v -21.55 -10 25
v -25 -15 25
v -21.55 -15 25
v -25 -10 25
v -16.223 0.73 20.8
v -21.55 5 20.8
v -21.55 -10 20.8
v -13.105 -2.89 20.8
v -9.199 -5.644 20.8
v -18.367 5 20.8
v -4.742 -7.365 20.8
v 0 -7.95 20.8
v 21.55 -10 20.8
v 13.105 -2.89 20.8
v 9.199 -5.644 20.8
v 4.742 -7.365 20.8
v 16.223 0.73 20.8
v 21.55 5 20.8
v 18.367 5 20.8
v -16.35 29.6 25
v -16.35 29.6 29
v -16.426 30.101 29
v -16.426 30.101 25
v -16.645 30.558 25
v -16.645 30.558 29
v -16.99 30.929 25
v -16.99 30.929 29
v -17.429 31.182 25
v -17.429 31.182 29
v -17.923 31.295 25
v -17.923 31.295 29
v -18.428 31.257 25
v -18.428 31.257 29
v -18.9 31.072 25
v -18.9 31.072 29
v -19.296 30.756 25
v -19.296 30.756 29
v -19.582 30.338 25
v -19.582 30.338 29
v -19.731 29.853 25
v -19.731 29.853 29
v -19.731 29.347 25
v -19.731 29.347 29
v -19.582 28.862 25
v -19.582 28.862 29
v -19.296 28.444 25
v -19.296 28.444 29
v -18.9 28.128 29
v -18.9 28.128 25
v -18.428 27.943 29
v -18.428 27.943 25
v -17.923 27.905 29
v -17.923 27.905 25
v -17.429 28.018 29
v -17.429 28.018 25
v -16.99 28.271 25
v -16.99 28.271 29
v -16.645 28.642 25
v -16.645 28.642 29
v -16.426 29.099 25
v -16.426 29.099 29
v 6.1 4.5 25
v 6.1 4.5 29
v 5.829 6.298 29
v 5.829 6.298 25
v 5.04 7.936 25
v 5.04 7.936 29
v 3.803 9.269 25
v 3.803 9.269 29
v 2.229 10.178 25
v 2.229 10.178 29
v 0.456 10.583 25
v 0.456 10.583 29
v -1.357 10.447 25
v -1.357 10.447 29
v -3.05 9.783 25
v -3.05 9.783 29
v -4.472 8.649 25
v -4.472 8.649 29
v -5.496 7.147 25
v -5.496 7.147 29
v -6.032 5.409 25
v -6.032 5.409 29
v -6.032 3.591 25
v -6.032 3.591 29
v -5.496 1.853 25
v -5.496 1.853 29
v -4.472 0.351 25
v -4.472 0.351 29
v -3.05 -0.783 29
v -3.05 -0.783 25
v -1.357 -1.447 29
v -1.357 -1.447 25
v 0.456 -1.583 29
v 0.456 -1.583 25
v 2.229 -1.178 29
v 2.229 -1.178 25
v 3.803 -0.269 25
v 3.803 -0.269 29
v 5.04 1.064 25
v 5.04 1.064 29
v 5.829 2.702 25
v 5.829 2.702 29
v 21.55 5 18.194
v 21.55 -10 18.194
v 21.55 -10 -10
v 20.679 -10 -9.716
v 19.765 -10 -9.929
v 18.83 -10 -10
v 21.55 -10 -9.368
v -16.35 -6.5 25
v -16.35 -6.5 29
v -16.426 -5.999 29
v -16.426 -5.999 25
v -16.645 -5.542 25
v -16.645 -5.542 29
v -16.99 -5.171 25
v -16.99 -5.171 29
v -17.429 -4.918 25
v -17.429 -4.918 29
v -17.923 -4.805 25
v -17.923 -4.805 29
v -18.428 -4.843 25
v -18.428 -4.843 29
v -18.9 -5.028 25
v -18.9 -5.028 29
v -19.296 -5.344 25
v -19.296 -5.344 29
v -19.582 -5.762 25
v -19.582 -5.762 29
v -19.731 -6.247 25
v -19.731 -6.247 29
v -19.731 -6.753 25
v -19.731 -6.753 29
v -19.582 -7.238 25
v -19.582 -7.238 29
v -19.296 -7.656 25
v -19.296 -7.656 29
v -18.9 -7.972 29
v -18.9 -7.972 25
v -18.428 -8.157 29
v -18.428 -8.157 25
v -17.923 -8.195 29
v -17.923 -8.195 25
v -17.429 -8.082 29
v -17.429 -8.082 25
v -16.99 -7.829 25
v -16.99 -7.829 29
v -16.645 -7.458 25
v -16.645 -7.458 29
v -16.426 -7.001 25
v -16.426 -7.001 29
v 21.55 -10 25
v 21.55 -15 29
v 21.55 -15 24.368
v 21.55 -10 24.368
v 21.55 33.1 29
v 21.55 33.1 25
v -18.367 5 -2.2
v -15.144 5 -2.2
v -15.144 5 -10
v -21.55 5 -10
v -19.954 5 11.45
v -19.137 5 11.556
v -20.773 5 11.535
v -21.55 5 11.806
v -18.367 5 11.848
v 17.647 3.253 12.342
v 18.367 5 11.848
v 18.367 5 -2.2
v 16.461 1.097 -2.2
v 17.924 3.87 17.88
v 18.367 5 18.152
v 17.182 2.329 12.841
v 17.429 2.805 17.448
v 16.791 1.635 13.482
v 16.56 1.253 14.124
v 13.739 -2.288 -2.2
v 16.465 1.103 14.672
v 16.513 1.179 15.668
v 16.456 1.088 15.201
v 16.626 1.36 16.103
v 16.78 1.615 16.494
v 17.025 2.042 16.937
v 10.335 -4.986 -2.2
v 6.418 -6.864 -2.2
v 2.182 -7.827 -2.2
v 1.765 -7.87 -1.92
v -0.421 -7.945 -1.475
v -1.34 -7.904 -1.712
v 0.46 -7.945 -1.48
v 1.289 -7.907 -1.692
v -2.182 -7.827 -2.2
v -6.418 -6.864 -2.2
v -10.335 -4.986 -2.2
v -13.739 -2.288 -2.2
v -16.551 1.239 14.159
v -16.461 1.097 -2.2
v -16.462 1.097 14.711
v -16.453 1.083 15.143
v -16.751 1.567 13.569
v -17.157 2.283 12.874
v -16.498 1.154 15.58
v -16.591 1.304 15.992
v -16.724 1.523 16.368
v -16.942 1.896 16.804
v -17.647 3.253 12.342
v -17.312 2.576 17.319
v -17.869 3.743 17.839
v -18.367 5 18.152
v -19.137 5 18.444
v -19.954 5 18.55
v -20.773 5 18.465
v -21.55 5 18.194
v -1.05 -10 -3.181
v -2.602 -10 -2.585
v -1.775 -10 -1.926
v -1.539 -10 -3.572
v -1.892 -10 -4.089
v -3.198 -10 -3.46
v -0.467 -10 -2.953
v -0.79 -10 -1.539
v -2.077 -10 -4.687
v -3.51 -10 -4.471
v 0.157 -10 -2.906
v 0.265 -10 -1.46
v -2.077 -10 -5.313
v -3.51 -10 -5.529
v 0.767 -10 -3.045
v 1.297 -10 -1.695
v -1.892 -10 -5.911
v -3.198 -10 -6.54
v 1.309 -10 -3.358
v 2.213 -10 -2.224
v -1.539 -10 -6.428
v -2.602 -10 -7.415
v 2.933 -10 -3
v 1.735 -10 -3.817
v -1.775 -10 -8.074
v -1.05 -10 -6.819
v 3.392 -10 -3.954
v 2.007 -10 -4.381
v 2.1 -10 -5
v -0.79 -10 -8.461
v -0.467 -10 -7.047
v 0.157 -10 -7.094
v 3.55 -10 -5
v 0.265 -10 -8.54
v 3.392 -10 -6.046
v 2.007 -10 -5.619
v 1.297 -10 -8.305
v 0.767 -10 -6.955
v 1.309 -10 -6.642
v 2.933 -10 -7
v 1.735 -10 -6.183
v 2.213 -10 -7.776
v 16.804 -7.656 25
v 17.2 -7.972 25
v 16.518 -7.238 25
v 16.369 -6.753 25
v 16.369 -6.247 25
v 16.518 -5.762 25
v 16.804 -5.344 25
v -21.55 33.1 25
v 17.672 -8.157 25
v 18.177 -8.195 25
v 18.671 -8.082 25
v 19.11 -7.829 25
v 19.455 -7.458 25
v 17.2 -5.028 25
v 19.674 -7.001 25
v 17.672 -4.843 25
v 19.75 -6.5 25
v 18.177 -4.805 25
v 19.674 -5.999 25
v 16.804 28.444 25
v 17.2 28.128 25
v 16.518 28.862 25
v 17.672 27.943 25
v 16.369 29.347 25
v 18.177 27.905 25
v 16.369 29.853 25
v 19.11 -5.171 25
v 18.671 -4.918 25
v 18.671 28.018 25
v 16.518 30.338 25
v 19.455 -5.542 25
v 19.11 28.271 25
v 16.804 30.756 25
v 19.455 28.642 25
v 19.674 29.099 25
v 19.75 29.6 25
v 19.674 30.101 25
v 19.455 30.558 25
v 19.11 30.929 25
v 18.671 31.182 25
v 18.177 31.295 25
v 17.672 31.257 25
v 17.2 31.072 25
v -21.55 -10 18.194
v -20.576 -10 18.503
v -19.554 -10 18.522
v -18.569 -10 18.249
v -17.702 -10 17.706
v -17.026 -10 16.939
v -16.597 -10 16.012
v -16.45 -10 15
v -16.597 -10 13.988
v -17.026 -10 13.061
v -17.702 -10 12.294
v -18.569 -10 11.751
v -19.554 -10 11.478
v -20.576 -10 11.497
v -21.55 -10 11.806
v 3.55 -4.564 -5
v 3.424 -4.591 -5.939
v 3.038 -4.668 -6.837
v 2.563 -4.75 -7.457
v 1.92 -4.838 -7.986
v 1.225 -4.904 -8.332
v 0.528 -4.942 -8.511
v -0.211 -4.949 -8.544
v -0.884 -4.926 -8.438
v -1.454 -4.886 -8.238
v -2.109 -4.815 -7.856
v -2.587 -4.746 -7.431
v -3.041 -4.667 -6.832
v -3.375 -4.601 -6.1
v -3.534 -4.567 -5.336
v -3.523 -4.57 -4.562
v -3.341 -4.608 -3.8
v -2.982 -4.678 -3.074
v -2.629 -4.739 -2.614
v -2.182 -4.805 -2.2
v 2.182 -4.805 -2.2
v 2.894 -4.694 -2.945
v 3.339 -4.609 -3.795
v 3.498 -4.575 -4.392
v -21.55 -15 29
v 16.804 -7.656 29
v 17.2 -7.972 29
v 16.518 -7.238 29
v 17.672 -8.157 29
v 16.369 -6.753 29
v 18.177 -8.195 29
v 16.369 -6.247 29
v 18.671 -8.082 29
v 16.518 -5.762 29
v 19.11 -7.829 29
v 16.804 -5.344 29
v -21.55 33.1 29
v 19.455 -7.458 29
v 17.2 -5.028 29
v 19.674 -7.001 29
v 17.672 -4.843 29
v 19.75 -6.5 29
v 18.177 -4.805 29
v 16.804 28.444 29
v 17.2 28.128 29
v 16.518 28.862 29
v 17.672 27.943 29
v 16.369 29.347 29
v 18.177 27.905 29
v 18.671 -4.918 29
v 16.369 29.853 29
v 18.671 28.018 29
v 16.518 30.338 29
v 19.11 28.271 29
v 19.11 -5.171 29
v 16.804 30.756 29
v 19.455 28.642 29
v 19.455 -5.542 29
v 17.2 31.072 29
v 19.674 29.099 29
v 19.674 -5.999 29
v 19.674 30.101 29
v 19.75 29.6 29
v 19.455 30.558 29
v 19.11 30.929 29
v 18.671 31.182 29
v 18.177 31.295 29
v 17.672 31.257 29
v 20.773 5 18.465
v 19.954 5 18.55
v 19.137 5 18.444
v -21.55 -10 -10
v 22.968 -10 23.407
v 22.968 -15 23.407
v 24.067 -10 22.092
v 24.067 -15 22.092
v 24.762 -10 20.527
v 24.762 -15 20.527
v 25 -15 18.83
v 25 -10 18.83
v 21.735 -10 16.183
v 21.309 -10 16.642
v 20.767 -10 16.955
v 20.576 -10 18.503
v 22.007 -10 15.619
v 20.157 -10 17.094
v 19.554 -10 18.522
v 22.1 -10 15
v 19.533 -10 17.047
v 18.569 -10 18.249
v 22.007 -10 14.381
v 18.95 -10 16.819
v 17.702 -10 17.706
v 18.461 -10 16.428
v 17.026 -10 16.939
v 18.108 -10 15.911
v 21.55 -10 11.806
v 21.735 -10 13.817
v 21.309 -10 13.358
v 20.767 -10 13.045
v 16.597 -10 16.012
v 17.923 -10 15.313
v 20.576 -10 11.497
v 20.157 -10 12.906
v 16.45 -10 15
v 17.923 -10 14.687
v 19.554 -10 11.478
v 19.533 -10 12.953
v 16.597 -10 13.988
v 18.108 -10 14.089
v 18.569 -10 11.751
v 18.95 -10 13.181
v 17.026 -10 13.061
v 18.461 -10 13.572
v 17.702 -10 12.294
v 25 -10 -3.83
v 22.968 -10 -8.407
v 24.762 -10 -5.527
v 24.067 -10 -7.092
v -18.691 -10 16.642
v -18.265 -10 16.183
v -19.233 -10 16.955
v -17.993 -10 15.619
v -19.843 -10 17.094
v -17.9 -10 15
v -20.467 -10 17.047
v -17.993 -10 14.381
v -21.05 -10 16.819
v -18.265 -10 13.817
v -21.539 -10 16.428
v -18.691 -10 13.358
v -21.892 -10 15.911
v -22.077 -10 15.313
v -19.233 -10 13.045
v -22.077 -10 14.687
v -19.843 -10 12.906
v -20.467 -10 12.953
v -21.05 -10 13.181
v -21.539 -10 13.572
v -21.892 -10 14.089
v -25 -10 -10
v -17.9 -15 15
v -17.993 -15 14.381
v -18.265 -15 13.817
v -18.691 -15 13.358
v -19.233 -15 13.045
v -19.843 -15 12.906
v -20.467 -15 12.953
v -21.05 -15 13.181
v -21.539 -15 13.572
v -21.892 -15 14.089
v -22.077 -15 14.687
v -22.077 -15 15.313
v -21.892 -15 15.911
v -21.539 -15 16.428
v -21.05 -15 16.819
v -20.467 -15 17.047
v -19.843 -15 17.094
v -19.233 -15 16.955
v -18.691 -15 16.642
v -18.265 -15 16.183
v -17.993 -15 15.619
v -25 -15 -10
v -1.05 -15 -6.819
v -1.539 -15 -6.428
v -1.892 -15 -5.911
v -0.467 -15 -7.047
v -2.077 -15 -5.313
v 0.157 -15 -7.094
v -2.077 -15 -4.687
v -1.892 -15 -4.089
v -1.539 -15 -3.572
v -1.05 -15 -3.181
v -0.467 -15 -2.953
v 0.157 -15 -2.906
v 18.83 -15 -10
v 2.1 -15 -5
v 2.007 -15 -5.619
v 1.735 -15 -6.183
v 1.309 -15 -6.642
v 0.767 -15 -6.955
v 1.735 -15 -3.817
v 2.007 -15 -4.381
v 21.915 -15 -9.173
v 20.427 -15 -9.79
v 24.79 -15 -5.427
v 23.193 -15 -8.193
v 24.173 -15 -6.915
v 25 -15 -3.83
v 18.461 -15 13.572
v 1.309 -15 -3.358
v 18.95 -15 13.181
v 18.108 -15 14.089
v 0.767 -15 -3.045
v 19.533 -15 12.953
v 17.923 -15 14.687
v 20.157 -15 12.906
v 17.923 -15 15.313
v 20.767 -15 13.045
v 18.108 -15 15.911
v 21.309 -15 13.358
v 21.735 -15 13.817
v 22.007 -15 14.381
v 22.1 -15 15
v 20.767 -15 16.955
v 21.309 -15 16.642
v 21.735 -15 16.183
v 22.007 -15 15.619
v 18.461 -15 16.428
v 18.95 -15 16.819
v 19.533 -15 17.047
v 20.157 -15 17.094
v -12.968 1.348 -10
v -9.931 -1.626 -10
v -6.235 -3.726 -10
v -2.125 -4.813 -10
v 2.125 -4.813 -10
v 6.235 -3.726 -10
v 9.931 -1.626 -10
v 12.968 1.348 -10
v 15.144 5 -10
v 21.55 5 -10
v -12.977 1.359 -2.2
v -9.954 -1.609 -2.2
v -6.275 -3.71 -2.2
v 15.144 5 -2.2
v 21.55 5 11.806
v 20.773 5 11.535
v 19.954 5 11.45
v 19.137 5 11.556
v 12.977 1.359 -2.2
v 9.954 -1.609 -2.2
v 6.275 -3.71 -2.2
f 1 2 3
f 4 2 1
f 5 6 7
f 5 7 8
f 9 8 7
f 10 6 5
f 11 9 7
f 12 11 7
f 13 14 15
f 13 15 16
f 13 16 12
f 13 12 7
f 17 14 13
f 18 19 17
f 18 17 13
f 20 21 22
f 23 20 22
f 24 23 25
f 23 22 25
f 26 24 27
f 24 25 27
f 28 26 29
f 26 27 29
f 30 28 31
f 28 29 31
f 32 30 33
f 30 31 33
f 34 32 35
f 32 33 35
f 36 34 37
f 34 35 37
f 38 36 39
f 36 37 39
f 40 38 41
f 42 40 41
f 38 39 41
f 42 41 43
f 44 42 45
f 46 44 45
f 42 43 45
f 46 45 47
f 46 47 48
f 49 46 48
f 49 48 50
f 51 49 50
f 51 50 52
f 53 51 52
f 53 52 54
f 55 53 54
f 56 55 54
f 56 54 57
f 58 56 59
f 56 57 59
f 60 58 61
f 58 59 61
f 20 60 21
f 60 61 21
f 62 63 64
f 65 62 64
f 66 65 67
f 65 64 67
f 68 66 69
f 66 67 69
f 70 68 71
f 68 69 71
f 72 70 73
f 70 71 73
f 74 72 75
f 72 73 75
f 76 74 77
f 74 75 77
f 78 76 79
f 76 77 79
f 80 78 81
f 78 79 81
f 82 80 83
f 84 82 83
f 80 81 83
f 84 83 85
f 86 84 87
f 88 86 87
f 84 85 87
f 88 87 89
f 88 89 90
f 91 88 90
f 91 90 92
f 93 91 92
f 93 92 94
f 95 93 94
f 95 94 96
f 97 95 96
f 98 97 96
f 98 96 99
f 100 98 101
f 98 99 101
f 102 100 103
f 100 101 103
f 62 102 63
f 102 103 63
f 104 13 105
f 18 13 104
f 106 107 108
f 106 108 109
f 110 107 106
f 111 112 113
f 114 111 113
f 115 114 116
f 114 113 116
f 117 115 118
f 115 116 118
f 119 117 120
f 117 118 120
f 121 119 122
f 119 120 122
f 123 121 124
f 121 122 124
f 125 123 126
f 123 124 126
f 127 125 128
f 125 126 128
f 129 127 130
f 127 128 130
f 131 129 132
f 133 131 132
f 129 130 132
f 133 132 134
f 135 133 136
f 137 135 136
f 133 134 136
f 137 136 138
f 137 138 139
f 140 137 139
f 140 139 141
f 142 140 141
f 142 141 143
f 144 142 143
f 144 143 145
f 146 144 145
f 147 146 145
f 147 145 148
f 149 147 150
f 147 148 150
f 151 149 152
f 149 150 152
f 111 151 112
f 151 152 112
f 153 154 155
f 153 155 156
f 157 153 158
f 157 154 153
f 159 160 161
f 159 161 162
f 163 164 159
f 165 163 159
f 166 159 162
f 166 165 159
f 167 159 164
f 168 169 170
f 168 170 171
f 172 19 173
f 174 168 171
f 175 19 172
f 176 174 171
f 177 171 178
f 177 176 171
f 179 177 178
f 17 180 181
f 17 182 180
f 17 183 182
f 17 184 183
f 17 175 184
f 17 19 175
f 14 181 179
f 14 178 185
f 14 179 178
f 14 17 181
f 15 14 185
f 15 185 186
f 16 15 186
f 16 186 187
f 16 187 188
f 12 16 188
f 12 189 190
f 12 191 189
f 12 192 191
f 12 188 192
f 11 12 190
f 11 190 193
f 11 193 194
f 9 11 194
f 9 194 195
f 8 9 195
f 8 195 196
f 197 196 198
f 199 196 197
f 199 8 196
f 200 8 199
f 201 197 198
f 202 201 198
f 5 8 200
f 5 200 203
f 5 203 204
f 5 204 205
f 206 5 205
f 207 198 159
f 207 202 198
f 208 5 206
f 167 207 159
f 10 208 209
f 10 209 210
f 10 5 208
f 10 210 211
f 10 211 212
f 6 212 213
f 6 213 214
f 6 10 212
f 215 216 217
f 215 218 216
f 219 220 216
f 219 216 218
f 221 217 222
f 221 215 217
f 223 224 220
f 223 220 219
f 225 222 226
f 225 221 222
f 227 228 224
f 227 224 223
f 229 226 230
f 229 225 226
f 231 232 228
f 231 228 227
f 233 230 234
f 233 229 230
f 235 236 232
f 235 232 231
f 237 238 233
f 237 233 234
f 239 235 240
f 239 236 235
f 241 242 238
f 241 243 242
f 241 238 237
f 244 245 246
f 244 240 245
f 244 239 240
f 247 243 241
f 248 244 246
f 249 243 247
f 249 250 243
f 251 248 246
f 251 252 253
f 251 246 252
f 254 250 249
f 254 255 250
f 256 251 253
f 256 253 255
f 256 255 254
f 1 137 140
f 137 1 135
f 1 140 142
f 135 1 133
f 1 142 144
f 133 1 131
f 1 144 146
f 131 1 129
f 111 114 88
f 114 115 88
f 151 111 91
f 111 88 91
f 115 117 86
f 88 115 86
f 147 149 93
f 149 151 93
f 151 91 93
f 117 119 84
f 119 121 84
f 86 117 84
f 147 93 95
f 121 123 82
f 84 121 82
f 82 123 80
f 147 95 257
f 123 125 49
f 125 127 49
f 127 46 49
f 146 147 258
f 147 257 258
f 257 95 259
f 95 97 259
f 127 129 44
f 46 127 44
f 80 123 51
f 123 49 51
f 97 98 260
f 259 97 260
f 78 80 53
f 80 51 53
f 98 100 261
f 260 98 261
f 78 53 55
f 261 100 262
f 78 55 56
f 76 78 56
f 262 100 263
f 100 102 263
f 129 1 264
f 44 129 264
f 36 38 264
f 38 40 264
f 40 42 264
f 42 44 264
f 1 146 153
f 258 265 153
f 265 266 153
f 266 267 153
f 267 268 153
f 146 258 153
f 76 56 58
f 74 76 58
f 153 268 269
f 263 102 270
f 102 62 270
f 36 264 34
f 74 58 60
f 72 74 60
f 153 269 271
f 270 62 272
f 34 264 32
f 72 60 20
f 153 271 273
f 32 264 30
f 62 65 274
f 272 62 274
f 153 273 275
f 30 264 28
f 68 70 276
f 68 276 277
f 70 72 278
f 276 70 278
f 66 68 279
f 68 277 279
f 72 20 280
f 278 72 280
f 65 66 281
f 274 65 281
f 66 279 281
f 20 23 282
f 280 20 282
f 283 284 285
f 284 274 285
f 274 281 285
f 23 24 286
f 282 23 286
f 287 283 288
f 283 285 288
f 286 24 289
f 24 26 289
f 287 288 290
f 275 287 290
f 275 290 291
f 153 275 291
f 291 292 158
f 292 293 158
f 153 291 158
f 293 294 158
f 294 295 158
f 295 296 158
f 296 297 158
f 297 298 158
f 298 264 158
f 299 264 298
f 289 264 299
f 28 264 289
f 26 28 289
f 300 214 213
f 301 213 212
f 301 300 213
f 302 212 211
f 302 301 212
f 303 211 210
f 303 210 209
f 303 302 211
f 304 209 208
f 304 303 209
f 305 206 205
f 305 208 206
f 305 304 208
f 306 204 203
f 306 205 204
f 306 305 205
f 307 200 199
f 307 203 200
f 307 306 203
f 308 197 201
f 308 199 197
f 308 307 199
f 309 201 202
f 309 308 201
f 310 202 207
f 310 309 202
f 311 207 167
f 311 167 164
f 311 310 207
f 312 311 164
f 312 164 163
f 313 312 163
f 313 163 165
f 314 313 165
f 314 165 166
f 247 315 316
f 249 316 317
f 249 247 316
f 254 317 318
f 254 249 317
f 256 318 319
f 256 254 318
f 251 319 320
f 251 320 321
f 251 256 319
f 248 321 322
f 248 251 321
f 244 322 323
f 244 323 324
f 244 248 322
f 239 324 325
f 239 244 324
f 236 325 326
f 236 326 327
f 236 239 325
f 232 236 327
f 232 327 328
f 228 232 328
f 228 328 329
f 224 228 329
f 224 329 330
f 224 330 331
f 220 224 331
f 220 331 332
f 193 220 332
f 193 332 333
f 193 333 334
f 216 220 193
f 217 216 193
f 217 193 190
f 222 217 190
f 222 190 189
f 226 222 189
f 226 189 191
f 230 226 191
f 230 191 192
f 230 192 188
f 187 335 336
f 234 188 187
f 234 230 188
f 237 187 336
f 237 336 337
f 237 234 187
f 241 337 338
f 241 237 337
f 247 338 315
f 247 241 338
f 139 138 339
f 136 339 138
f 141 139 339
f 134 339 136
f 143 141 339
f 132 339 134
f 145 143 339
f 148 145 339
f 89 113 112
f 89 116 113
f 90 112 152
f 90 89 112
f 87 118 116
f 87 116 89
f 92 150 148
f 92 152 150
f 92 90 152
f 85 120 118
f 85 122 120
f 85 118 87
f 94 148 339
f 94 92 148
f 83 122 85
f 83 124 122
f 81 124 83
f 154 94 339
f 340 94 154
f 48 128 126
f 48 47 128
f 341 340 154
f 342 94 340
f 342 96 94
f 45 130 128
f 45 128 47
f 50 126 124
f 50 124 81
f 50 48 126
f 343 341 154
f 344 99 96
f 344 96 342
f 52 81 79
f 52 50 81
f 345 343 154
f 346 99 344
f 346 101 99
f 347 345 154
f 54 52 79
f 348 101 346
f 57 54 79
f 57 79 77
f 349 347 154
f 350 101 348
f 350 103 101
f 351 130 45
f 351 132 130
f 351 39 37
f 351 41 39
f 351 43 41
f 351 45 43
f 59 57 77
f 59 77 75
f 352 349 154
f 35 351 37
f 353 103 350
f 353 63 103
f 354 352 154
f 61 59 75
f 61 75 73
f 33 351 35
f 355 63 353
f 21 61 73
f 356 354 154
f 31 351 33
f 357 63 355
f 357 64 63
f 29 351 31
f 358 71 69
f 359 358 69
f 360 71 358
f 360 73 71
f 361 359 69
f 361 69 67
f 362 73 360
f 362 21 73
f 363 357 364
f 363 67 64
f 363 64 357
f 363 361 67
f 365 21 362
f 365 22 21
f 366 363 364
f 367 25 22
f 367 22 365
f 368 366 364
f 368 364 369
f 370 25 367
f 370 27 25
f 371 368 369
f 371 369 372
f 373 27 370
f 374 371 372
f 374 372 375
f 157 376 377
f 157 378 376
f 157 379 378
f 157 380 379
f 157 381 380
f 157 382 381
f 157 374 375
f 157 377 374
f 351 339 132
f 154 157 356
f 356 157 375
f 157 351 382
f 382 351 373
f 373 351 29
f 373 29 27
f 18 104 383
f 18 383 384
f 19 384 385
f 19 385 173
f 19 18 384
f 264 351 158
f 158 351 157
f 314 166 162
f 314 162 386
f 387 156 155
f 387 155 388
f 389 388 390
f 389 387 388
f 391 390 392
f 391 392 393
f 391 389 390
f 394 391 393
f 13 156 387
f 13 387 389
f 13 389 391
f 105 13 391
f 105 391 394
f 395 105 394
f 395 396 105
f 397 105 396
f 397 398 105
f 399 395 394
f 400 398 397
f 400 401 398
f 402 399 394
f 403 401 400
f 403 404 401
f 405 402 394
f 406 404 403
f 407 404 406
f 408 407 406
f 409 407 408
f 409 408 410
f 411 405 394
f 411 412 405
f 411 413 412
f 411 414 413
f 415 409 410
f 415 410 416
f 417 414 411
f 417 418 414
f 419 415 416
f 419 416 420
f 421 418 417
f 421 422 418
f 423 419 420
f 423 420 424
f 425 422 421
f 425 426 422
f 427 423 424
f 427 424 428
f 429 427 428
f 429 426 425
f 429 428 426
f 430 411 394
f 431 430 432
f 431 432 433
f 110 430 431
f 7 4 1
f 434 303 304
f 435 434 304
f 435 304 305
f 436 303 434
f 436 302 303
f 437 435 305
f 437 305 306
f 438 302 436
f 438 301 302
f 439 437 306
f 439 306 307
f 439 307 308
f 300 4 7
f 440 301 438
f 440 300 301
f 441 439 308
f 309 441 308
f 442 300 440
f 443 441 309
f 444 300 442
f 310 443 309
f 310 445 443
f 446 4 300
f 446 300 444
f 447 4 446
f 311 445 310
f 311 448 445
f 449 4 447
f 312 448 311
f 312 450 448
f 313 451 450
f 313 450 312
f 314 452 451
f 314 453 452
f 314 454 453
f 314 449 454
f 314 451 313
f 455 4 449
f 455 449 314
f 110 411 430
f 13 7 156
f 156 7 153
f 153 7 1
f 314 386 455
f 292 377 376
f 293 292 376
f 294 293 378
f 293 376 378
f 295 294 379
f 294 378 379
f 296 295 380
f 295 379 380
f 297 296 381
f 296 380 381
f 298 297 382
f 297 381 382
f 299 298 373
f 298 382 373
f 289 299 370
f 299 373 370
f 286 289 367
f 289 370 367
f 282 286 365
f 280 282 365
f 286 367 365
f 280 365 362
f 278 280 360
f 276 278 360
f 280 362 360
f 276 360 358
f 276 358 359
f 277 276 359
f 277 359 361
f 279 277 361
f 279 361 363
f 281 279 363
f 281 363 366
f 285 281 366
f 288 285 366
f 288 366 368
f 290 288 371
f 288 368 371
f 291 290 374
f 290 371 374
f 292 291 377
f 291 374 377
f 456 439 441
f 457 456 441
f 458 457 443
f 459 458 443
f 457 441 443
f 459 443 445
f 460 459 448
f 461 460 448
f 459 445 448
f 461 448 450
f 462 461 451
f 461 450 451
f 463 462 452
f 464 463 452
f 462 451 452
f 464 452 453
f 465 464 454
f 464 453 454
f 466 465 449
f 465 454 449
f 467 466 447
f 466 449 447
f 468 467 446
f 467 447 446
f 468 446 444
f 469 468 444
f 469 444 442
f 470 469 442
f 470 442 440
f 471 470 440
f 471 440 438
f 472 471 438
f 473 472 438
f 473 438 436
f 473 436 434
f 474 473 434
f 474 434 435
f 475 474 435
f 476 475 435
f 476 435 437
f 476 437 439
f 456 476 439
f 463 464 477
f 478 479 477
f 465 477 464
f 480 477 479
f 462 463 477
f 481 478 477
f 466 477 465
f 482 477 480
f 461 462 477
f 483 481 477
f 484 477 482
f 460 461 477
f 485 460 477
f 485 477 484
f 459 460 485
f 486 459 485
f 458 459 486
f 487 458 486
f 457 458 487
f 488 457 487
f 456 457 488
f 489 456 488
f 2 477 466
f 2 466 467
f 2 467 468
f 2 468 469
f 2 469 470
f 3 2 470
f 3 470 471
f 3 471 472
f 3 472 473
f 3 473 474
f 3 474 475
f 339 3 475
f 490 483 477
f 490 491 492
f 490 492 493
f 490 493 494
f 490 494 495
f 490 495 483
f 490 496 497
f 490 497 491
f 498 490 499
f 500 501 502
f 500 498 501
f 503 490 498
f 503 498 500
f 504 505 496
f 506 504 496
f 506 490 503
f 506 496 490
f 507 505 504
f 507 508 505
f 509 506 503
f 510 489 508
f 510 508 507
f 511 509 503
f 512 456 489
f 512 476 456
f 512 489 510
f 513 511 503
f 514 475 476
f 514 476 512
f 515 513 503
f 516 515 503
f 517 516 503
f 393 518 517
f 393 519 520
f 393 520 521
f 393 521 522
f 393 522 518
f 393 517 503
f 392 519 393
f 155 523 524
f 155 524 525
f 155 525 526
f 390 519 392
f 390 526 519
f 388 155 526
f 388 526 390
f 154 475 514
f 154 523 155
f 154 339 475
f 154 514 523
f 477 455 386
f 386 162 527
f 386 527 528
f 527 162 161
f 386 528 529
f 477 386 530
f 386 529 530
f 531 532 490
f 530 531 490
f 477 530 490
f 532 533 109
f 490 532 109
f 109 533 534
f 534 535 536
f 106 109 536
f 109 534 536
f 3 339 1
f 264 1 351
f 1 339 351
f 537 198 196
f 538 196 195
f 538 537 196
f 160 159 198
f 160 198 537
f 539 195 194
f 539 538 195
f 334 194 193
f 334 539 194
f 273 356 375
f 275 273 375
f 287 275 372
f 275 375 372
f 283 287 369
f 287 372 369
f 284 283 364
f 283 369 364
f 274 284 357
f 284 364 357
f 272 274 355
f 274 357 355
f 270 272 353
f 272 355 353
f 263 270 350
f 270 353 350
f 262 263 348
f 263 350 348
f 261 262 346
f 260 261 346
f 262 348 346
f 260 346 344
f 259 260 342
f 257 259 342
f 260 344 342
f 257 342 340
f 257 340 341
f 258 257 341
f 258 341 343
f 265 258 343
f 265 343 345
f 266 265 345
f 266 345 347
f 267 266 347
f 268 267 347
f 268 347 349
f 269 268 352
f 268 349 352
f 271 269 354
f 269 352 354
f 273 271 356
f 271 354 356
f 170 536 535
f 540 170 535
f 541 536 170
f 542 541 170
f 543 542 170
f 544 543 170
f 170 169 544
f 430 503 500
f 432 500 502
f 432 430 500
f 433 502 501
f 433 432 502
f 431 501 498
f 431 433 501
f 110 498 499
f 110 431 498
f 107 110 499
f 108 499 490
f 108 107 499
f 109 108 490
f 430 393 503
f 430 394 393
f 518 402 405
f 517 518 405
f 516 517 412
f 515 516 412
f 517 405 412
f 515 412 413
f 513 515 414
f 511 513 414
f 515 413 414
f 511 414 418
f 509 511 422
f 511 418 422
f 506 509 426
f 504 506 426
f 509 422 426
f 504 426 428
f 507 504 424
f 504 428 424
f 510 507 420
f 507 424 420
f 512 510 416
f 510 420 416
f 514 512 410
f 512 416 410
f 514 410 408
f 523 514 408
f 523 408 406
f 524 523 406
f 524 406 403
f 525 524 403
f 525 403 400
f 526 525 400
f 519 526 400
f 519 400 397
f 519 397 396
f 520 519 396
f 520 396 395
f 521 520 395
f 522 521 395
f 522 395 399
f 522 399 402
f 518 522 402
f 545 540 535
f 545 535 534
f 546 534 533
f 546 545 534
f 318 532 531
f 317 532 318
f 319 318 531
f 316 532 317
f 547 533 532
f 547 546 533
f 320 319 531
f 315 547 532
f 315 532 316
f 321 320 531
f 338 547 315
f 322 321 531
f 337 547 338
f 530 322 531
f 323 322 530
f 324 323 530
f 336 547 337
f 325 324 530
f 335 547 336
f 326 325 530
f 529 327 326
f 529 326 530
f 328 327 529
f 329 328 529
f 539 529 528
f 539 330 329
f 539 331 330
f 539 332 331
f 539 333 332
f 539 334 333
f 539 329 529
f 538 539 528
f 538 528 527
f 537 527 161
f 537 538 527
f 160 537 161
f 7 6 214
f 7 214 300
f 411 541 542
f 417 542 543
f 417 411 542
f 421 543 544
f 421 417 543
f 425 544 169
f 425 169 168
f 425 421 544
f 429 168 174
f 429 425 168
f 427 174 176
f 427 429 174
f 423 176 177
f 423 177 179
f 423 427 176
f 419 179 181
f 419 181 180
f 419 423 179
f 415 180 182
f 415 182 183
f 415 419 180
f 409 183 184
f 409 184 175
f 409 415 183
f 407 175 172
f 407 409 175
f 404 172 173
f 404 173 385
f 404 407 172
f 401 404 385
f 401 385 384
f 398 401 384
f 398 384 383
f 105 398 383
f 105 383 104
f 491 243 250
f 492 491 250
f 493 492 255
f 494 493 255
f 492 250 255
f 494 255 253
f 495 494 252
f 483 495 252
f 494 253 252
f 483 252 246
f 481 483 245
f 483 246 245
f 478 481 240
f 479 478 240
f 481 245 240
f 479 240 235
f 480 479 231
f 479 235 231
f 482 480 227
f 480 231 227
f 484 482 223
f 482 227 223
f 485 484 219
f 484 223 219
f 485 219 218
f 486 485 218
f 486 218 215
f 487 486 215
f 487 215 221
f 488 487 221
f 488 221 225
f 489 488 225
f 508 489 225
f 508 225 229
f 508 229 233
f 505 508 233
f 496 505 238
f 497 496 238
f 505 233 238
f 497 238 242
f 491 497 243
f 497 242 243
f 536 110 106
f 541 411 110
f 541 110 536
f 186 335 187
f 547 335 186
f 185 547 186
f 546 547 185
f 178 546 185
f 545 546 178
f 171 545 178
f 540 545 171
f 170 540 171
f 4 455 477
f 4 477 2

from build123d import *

# Parameters (mm, degrees)
SKETCH_1_W          = 30
SKETCH_1_H          = 30
EXTRUDE_1_DEPTH     = 5
SKETCH_2_W          = 30
SKETCH_2_H          = 5
EXTRUDE_2_DEPTH     = 10
SKETCH_3_R          = 2.1
CUT_EXTRUDE_1_DEPTH = 5
EXTRUDE_3_DEPTH     = 20
SKETCH_5_W          = 35
SKETCH_5_H          = 5
EXTRUDE_4_DEPTH     = 10
SKETCH_6_W          = 35
SKETCH_6_H          = 5
EXTRUDE_5_DEPTH     = 10
SKETCH_7_R          = 2.1
CUT_EXTRUDE_2_DEPTH = 10
FILLET_1_R          = 6.17
FILLET_2_R          = 6.17
SKETCH_8_W          = 43.093455854
SKETCH_8_H          = 31.755969384
CUT_EXTRUDE_3_DEPTH = 25
SKETCH_9_W          = 43.1
SKETCH_9_H          = 43.1
SKETCH_9_R          = 6.1
SKETCH_9_R_2        = 1.7
EXTRUDE_6_DEPTH     = 4
EXTRUDE_7_DEPTH     = 23
EXTRUDE_8_DEPTH     = 7.8
CUT_EXTRUDE_START   = -35
SKETCH_12_W         = 51.858978503
SKETCH_12_H         = 9.121001398
CUT_EXTRUDE_4_DEPTH = 35
SKETCH_14_W         = 43.1
SKETCH_14_H         = 5
EXTRUDE_9_DEPTH     = 8.2
SKETCH_15_R         = 2.1
CUT_EXTRUDE_5_DEPTH = 49.1
SKETCH_16_R         = 3.55
CUT_EXTRUDE_6_DEPTH = 44.1


with BuildPart() as part:
    # 스케치1 → 보스-돌출1 (new body)
    with BuildSketch(Plane.XY):
        Rectangle(SKETCH_1_W, SKETCH_1_H)
    extrude(amount=EXTRUDE_1_DEPTH)

    # 스케치2 → 보스-돌출2 (add)
    with BuildSketch(Plane(origin=(0, 0, 0), x_dir=(-1, 0, 0), z_dir=(0, 0, -1))):
        with Locations((0, -12.5)):
            Rectangle(SKETCH_2_W, SKETCH_2_H)
    extrude(amount=EXTRUDE_2_DEPTH)

    # 스케치3 → 컷-돌출1 (cut)
    with BuildSketch(Plane(origin=(0, -10, 0), x_dir=(1, 0, 0), z_dir=(0, 1, 0))):
        with Locations((0, 5)):
            Circle(SKETCH_3_R)
    extrude(amount=-CUT_EXTRUDE_1_DEPTH, mode=Mode.SUBTRACT)

    # 스케치4 → 보스-돌출3 (add)
    with BuildSketch(Plane.XY.offset(5)):
        Polygon((10.2, -15), (15, -15), (15, 15), (-15, 15), (-15, -15), (-10.2, -15), (-10.2, -18.997175384), (10.2, -18.997175384), align=None)
    extrude(amount=EXTRUDE_3_DEPTH)

    # 스케치5 → 보스-돌출4 (add)
    with BuildSketch(Plane.ZY.offset(15)):
        with Locations((7.5, -12.5)):
            Rectangle(SKETCH_5_W, SKETCH_5_H)
    extrude(amount=EXTRUDE_4_DEPTH)

    # 스케치6 → 보스-돌출5 (add)
    with BuildSketch(Plane(origin=(15, 0, 0), x_dir=(0, 0, -1), z_dir=(1, 0, 0))):
        with Locations((-7.5, -12.5)):
            Rectangle(SKETCH_6_W, SKETCH_6_H)
    extrude(amount=EXTRUDE_5_DEPTH)

    # 스케치7 → 컷-돌출2 (cut)
    with BuildSketch(Plane(origin=(0, -10, 0), x_dir=(1, 0, 0), z_dir=(0, 1, 0))):
        with Locations((-20, -15)):
            Circle(SKETCH_7_R)
        with Locations((20, -15)):
            Circle(SKETCH_7_R)
    extrude(amount=-CUT_EXTRUDE_2_DEPTH, mode=Mode.SUBTRACT)

    # 필렛1
    fillet_1_edges = [part.edges().sort_by_distance(p)[0] for p in [
        (25, -12.5, 25),
    ]]
    fillet(fillet_1_edges, radius=FILLET_1_R)

    # 필렛2
    fillet_2_edges = [part.edges().sort_by_distance(p)[0] for p in [
        (25, -12.5, -10),
    ]]
    fillet(fillet_2_edges, radius=FILLET_2_R)

    # 스케치8 → 컷-돌출3 (cut)
    with BuildSketch(Plane(origin=(0, 15, 0), x_dir=(1, 0, 0), z_dir=(0, 1, 0))):
        with Locations((-0.577881592, -10.851708682)):
            Rectangle(SKETCH_8_W, SKETCH_8_H)
    extrude(amount=-CUT_EXTRUDE_3_DEPTH, mode=Mode.SUBTRACT)

    # 스케치12 → 컷-돌출4 (cut)
    with BuildSketch(Plane.XY.offset(25).offset(CUT_EXTRUDE_START)):
        with Locations((0.929489252, -19.560500699)):
            Rectangle(SKETCH_12_W, SKETCH_12_H)
    extrude(amount=CUT_EXTRUDE_4_DEPTH, mode=Mode.SUBTRACT)



with BuildPart() as body_2:
    # 스케치9 → 보스-돌출6 (new body)
    with BuildSketch(Plane.XY.offset(29)):
        with Locations((0, 11.55)):
            Rectangle(SKETCH_9_W, SKETCH_9_H)
        with Locations((0, 4.5)):
            Circle(SKETCH_9_R, mode=Mode.SUBTRACT)
        with Locations((18.05, 29.6)):
            Circle(SKETCH_9_R_2, mode=Mode.SUBTRACT)
        with Locations((18.05, -6.5)):
            Circle(SKETCH_9_R_2, mode=Mode.SUBTRACT)
        with Locations((-18.05, -6.5)):
            Circle(SKETCH_9_R_2, mode=Mode.SUBTRACT)
        with Locations((-18.05, 29.6)):
            Circle(SKETCH_9_R_2, mode=Mode.SUBTRACT)
    extrude(amount=-EXTRUDE_6_DEPTH)


with BuildPart() as body_3:
    # 스케치10 → 보스-돌출7 (new body)
    with BuildSketch(Plane(origin=(0, 0, 20.8), x_dir=(-1, 0, 0), z_dir=(0, 0, -1))):
        with BuildLine():
            Line((-21.55, 5), (-18.367022078, 5))
            ThreePointArc((-18.367022078, 5), (0, -7.95), (18.367022078, 5))
            Line((18.367022078, 5), (21.55, 5))
            Line((21.55, 5), (21.55, -10))
            Line((21.55, -10), (-21.55, -10))
            Line((-21.55, -10), (-21.55, 5))
        make_face()
    extrude(amount=EXTRUDE_7_DEPTH)

    # 스케치11 → 보스-돌출8 (add)
    with BuildSketch(Plane(origin=(0, 0, -2.2), x_dir=(-1, 0, 0), z_dir=(0, 0, -1))):
        with BuildLine():
            Line((-21.55, 5), (-15.144223321, 5))
            ThreePointArc((-15.144223321, 5), (0, -4.95), (15.144223321, 5))
            Line((15.144223321, 5), (21.55, 5))
            Line((21.55, 5), (21.55, -10))
            Line((21.55, -10), (-21.55, -10))
            Line((-21.55, -10), (-21.55, 5))
        make_face()
    extrude(amount=EXTRUDE_8_DEPTH)


with BuildPart() as part_1:
    add(part.part)

    add(body_2.part)  # 보스-돌출9 merges body 2

    add(body_3.part)  # 보스-돌출9 merges body 3
    # 스케치14 → 보스-돌출9 (add)
    with BuildSketch(Plane.XY.offset(29)):
        with Locations((0, -12.5)):
            Rectangle(SKETCH_14_W, SKETCH_14_H)
    extrude(amount=-EXTRUDE_9_DEPTH)

    # 스케치15 → 컷-돌출5 (cut, through all)
    with BuildSketch(Plane.XZ.offset(15)):
        with Locations((-20, 15)):
            Circle(SKETCH_15_R)
        with Locations((0, -5)):
            Circle(SKETCH_15_R)
        with Locations((20, 15)):
            Circle(SKETCH_15_R)
    extrude(amount=-CUT_EXTRUDE_5_DEPTH, mode=Mode.SUBTRACT)

    # 스케치16 → 컷-돌출6 (cut, through all)
    with BuildSketch(Plane(origin=(0, -10, 0), x_dir=(1, 0, 0), z_dir=(0, 1, 0))):
        with Locations((20, -15)):
            Circle(SKETCH_16_R)
        with Locations((0, 5)):
            Circle(SKETCH_16_R)
        with Locations((-20, -15)):
            Circle(SKETCH_16_R)
    extrude(amount=CUT_EXTRUDE_6_DEPTH, mode=Mode.SUBTRACT)


solid = part_1.part
